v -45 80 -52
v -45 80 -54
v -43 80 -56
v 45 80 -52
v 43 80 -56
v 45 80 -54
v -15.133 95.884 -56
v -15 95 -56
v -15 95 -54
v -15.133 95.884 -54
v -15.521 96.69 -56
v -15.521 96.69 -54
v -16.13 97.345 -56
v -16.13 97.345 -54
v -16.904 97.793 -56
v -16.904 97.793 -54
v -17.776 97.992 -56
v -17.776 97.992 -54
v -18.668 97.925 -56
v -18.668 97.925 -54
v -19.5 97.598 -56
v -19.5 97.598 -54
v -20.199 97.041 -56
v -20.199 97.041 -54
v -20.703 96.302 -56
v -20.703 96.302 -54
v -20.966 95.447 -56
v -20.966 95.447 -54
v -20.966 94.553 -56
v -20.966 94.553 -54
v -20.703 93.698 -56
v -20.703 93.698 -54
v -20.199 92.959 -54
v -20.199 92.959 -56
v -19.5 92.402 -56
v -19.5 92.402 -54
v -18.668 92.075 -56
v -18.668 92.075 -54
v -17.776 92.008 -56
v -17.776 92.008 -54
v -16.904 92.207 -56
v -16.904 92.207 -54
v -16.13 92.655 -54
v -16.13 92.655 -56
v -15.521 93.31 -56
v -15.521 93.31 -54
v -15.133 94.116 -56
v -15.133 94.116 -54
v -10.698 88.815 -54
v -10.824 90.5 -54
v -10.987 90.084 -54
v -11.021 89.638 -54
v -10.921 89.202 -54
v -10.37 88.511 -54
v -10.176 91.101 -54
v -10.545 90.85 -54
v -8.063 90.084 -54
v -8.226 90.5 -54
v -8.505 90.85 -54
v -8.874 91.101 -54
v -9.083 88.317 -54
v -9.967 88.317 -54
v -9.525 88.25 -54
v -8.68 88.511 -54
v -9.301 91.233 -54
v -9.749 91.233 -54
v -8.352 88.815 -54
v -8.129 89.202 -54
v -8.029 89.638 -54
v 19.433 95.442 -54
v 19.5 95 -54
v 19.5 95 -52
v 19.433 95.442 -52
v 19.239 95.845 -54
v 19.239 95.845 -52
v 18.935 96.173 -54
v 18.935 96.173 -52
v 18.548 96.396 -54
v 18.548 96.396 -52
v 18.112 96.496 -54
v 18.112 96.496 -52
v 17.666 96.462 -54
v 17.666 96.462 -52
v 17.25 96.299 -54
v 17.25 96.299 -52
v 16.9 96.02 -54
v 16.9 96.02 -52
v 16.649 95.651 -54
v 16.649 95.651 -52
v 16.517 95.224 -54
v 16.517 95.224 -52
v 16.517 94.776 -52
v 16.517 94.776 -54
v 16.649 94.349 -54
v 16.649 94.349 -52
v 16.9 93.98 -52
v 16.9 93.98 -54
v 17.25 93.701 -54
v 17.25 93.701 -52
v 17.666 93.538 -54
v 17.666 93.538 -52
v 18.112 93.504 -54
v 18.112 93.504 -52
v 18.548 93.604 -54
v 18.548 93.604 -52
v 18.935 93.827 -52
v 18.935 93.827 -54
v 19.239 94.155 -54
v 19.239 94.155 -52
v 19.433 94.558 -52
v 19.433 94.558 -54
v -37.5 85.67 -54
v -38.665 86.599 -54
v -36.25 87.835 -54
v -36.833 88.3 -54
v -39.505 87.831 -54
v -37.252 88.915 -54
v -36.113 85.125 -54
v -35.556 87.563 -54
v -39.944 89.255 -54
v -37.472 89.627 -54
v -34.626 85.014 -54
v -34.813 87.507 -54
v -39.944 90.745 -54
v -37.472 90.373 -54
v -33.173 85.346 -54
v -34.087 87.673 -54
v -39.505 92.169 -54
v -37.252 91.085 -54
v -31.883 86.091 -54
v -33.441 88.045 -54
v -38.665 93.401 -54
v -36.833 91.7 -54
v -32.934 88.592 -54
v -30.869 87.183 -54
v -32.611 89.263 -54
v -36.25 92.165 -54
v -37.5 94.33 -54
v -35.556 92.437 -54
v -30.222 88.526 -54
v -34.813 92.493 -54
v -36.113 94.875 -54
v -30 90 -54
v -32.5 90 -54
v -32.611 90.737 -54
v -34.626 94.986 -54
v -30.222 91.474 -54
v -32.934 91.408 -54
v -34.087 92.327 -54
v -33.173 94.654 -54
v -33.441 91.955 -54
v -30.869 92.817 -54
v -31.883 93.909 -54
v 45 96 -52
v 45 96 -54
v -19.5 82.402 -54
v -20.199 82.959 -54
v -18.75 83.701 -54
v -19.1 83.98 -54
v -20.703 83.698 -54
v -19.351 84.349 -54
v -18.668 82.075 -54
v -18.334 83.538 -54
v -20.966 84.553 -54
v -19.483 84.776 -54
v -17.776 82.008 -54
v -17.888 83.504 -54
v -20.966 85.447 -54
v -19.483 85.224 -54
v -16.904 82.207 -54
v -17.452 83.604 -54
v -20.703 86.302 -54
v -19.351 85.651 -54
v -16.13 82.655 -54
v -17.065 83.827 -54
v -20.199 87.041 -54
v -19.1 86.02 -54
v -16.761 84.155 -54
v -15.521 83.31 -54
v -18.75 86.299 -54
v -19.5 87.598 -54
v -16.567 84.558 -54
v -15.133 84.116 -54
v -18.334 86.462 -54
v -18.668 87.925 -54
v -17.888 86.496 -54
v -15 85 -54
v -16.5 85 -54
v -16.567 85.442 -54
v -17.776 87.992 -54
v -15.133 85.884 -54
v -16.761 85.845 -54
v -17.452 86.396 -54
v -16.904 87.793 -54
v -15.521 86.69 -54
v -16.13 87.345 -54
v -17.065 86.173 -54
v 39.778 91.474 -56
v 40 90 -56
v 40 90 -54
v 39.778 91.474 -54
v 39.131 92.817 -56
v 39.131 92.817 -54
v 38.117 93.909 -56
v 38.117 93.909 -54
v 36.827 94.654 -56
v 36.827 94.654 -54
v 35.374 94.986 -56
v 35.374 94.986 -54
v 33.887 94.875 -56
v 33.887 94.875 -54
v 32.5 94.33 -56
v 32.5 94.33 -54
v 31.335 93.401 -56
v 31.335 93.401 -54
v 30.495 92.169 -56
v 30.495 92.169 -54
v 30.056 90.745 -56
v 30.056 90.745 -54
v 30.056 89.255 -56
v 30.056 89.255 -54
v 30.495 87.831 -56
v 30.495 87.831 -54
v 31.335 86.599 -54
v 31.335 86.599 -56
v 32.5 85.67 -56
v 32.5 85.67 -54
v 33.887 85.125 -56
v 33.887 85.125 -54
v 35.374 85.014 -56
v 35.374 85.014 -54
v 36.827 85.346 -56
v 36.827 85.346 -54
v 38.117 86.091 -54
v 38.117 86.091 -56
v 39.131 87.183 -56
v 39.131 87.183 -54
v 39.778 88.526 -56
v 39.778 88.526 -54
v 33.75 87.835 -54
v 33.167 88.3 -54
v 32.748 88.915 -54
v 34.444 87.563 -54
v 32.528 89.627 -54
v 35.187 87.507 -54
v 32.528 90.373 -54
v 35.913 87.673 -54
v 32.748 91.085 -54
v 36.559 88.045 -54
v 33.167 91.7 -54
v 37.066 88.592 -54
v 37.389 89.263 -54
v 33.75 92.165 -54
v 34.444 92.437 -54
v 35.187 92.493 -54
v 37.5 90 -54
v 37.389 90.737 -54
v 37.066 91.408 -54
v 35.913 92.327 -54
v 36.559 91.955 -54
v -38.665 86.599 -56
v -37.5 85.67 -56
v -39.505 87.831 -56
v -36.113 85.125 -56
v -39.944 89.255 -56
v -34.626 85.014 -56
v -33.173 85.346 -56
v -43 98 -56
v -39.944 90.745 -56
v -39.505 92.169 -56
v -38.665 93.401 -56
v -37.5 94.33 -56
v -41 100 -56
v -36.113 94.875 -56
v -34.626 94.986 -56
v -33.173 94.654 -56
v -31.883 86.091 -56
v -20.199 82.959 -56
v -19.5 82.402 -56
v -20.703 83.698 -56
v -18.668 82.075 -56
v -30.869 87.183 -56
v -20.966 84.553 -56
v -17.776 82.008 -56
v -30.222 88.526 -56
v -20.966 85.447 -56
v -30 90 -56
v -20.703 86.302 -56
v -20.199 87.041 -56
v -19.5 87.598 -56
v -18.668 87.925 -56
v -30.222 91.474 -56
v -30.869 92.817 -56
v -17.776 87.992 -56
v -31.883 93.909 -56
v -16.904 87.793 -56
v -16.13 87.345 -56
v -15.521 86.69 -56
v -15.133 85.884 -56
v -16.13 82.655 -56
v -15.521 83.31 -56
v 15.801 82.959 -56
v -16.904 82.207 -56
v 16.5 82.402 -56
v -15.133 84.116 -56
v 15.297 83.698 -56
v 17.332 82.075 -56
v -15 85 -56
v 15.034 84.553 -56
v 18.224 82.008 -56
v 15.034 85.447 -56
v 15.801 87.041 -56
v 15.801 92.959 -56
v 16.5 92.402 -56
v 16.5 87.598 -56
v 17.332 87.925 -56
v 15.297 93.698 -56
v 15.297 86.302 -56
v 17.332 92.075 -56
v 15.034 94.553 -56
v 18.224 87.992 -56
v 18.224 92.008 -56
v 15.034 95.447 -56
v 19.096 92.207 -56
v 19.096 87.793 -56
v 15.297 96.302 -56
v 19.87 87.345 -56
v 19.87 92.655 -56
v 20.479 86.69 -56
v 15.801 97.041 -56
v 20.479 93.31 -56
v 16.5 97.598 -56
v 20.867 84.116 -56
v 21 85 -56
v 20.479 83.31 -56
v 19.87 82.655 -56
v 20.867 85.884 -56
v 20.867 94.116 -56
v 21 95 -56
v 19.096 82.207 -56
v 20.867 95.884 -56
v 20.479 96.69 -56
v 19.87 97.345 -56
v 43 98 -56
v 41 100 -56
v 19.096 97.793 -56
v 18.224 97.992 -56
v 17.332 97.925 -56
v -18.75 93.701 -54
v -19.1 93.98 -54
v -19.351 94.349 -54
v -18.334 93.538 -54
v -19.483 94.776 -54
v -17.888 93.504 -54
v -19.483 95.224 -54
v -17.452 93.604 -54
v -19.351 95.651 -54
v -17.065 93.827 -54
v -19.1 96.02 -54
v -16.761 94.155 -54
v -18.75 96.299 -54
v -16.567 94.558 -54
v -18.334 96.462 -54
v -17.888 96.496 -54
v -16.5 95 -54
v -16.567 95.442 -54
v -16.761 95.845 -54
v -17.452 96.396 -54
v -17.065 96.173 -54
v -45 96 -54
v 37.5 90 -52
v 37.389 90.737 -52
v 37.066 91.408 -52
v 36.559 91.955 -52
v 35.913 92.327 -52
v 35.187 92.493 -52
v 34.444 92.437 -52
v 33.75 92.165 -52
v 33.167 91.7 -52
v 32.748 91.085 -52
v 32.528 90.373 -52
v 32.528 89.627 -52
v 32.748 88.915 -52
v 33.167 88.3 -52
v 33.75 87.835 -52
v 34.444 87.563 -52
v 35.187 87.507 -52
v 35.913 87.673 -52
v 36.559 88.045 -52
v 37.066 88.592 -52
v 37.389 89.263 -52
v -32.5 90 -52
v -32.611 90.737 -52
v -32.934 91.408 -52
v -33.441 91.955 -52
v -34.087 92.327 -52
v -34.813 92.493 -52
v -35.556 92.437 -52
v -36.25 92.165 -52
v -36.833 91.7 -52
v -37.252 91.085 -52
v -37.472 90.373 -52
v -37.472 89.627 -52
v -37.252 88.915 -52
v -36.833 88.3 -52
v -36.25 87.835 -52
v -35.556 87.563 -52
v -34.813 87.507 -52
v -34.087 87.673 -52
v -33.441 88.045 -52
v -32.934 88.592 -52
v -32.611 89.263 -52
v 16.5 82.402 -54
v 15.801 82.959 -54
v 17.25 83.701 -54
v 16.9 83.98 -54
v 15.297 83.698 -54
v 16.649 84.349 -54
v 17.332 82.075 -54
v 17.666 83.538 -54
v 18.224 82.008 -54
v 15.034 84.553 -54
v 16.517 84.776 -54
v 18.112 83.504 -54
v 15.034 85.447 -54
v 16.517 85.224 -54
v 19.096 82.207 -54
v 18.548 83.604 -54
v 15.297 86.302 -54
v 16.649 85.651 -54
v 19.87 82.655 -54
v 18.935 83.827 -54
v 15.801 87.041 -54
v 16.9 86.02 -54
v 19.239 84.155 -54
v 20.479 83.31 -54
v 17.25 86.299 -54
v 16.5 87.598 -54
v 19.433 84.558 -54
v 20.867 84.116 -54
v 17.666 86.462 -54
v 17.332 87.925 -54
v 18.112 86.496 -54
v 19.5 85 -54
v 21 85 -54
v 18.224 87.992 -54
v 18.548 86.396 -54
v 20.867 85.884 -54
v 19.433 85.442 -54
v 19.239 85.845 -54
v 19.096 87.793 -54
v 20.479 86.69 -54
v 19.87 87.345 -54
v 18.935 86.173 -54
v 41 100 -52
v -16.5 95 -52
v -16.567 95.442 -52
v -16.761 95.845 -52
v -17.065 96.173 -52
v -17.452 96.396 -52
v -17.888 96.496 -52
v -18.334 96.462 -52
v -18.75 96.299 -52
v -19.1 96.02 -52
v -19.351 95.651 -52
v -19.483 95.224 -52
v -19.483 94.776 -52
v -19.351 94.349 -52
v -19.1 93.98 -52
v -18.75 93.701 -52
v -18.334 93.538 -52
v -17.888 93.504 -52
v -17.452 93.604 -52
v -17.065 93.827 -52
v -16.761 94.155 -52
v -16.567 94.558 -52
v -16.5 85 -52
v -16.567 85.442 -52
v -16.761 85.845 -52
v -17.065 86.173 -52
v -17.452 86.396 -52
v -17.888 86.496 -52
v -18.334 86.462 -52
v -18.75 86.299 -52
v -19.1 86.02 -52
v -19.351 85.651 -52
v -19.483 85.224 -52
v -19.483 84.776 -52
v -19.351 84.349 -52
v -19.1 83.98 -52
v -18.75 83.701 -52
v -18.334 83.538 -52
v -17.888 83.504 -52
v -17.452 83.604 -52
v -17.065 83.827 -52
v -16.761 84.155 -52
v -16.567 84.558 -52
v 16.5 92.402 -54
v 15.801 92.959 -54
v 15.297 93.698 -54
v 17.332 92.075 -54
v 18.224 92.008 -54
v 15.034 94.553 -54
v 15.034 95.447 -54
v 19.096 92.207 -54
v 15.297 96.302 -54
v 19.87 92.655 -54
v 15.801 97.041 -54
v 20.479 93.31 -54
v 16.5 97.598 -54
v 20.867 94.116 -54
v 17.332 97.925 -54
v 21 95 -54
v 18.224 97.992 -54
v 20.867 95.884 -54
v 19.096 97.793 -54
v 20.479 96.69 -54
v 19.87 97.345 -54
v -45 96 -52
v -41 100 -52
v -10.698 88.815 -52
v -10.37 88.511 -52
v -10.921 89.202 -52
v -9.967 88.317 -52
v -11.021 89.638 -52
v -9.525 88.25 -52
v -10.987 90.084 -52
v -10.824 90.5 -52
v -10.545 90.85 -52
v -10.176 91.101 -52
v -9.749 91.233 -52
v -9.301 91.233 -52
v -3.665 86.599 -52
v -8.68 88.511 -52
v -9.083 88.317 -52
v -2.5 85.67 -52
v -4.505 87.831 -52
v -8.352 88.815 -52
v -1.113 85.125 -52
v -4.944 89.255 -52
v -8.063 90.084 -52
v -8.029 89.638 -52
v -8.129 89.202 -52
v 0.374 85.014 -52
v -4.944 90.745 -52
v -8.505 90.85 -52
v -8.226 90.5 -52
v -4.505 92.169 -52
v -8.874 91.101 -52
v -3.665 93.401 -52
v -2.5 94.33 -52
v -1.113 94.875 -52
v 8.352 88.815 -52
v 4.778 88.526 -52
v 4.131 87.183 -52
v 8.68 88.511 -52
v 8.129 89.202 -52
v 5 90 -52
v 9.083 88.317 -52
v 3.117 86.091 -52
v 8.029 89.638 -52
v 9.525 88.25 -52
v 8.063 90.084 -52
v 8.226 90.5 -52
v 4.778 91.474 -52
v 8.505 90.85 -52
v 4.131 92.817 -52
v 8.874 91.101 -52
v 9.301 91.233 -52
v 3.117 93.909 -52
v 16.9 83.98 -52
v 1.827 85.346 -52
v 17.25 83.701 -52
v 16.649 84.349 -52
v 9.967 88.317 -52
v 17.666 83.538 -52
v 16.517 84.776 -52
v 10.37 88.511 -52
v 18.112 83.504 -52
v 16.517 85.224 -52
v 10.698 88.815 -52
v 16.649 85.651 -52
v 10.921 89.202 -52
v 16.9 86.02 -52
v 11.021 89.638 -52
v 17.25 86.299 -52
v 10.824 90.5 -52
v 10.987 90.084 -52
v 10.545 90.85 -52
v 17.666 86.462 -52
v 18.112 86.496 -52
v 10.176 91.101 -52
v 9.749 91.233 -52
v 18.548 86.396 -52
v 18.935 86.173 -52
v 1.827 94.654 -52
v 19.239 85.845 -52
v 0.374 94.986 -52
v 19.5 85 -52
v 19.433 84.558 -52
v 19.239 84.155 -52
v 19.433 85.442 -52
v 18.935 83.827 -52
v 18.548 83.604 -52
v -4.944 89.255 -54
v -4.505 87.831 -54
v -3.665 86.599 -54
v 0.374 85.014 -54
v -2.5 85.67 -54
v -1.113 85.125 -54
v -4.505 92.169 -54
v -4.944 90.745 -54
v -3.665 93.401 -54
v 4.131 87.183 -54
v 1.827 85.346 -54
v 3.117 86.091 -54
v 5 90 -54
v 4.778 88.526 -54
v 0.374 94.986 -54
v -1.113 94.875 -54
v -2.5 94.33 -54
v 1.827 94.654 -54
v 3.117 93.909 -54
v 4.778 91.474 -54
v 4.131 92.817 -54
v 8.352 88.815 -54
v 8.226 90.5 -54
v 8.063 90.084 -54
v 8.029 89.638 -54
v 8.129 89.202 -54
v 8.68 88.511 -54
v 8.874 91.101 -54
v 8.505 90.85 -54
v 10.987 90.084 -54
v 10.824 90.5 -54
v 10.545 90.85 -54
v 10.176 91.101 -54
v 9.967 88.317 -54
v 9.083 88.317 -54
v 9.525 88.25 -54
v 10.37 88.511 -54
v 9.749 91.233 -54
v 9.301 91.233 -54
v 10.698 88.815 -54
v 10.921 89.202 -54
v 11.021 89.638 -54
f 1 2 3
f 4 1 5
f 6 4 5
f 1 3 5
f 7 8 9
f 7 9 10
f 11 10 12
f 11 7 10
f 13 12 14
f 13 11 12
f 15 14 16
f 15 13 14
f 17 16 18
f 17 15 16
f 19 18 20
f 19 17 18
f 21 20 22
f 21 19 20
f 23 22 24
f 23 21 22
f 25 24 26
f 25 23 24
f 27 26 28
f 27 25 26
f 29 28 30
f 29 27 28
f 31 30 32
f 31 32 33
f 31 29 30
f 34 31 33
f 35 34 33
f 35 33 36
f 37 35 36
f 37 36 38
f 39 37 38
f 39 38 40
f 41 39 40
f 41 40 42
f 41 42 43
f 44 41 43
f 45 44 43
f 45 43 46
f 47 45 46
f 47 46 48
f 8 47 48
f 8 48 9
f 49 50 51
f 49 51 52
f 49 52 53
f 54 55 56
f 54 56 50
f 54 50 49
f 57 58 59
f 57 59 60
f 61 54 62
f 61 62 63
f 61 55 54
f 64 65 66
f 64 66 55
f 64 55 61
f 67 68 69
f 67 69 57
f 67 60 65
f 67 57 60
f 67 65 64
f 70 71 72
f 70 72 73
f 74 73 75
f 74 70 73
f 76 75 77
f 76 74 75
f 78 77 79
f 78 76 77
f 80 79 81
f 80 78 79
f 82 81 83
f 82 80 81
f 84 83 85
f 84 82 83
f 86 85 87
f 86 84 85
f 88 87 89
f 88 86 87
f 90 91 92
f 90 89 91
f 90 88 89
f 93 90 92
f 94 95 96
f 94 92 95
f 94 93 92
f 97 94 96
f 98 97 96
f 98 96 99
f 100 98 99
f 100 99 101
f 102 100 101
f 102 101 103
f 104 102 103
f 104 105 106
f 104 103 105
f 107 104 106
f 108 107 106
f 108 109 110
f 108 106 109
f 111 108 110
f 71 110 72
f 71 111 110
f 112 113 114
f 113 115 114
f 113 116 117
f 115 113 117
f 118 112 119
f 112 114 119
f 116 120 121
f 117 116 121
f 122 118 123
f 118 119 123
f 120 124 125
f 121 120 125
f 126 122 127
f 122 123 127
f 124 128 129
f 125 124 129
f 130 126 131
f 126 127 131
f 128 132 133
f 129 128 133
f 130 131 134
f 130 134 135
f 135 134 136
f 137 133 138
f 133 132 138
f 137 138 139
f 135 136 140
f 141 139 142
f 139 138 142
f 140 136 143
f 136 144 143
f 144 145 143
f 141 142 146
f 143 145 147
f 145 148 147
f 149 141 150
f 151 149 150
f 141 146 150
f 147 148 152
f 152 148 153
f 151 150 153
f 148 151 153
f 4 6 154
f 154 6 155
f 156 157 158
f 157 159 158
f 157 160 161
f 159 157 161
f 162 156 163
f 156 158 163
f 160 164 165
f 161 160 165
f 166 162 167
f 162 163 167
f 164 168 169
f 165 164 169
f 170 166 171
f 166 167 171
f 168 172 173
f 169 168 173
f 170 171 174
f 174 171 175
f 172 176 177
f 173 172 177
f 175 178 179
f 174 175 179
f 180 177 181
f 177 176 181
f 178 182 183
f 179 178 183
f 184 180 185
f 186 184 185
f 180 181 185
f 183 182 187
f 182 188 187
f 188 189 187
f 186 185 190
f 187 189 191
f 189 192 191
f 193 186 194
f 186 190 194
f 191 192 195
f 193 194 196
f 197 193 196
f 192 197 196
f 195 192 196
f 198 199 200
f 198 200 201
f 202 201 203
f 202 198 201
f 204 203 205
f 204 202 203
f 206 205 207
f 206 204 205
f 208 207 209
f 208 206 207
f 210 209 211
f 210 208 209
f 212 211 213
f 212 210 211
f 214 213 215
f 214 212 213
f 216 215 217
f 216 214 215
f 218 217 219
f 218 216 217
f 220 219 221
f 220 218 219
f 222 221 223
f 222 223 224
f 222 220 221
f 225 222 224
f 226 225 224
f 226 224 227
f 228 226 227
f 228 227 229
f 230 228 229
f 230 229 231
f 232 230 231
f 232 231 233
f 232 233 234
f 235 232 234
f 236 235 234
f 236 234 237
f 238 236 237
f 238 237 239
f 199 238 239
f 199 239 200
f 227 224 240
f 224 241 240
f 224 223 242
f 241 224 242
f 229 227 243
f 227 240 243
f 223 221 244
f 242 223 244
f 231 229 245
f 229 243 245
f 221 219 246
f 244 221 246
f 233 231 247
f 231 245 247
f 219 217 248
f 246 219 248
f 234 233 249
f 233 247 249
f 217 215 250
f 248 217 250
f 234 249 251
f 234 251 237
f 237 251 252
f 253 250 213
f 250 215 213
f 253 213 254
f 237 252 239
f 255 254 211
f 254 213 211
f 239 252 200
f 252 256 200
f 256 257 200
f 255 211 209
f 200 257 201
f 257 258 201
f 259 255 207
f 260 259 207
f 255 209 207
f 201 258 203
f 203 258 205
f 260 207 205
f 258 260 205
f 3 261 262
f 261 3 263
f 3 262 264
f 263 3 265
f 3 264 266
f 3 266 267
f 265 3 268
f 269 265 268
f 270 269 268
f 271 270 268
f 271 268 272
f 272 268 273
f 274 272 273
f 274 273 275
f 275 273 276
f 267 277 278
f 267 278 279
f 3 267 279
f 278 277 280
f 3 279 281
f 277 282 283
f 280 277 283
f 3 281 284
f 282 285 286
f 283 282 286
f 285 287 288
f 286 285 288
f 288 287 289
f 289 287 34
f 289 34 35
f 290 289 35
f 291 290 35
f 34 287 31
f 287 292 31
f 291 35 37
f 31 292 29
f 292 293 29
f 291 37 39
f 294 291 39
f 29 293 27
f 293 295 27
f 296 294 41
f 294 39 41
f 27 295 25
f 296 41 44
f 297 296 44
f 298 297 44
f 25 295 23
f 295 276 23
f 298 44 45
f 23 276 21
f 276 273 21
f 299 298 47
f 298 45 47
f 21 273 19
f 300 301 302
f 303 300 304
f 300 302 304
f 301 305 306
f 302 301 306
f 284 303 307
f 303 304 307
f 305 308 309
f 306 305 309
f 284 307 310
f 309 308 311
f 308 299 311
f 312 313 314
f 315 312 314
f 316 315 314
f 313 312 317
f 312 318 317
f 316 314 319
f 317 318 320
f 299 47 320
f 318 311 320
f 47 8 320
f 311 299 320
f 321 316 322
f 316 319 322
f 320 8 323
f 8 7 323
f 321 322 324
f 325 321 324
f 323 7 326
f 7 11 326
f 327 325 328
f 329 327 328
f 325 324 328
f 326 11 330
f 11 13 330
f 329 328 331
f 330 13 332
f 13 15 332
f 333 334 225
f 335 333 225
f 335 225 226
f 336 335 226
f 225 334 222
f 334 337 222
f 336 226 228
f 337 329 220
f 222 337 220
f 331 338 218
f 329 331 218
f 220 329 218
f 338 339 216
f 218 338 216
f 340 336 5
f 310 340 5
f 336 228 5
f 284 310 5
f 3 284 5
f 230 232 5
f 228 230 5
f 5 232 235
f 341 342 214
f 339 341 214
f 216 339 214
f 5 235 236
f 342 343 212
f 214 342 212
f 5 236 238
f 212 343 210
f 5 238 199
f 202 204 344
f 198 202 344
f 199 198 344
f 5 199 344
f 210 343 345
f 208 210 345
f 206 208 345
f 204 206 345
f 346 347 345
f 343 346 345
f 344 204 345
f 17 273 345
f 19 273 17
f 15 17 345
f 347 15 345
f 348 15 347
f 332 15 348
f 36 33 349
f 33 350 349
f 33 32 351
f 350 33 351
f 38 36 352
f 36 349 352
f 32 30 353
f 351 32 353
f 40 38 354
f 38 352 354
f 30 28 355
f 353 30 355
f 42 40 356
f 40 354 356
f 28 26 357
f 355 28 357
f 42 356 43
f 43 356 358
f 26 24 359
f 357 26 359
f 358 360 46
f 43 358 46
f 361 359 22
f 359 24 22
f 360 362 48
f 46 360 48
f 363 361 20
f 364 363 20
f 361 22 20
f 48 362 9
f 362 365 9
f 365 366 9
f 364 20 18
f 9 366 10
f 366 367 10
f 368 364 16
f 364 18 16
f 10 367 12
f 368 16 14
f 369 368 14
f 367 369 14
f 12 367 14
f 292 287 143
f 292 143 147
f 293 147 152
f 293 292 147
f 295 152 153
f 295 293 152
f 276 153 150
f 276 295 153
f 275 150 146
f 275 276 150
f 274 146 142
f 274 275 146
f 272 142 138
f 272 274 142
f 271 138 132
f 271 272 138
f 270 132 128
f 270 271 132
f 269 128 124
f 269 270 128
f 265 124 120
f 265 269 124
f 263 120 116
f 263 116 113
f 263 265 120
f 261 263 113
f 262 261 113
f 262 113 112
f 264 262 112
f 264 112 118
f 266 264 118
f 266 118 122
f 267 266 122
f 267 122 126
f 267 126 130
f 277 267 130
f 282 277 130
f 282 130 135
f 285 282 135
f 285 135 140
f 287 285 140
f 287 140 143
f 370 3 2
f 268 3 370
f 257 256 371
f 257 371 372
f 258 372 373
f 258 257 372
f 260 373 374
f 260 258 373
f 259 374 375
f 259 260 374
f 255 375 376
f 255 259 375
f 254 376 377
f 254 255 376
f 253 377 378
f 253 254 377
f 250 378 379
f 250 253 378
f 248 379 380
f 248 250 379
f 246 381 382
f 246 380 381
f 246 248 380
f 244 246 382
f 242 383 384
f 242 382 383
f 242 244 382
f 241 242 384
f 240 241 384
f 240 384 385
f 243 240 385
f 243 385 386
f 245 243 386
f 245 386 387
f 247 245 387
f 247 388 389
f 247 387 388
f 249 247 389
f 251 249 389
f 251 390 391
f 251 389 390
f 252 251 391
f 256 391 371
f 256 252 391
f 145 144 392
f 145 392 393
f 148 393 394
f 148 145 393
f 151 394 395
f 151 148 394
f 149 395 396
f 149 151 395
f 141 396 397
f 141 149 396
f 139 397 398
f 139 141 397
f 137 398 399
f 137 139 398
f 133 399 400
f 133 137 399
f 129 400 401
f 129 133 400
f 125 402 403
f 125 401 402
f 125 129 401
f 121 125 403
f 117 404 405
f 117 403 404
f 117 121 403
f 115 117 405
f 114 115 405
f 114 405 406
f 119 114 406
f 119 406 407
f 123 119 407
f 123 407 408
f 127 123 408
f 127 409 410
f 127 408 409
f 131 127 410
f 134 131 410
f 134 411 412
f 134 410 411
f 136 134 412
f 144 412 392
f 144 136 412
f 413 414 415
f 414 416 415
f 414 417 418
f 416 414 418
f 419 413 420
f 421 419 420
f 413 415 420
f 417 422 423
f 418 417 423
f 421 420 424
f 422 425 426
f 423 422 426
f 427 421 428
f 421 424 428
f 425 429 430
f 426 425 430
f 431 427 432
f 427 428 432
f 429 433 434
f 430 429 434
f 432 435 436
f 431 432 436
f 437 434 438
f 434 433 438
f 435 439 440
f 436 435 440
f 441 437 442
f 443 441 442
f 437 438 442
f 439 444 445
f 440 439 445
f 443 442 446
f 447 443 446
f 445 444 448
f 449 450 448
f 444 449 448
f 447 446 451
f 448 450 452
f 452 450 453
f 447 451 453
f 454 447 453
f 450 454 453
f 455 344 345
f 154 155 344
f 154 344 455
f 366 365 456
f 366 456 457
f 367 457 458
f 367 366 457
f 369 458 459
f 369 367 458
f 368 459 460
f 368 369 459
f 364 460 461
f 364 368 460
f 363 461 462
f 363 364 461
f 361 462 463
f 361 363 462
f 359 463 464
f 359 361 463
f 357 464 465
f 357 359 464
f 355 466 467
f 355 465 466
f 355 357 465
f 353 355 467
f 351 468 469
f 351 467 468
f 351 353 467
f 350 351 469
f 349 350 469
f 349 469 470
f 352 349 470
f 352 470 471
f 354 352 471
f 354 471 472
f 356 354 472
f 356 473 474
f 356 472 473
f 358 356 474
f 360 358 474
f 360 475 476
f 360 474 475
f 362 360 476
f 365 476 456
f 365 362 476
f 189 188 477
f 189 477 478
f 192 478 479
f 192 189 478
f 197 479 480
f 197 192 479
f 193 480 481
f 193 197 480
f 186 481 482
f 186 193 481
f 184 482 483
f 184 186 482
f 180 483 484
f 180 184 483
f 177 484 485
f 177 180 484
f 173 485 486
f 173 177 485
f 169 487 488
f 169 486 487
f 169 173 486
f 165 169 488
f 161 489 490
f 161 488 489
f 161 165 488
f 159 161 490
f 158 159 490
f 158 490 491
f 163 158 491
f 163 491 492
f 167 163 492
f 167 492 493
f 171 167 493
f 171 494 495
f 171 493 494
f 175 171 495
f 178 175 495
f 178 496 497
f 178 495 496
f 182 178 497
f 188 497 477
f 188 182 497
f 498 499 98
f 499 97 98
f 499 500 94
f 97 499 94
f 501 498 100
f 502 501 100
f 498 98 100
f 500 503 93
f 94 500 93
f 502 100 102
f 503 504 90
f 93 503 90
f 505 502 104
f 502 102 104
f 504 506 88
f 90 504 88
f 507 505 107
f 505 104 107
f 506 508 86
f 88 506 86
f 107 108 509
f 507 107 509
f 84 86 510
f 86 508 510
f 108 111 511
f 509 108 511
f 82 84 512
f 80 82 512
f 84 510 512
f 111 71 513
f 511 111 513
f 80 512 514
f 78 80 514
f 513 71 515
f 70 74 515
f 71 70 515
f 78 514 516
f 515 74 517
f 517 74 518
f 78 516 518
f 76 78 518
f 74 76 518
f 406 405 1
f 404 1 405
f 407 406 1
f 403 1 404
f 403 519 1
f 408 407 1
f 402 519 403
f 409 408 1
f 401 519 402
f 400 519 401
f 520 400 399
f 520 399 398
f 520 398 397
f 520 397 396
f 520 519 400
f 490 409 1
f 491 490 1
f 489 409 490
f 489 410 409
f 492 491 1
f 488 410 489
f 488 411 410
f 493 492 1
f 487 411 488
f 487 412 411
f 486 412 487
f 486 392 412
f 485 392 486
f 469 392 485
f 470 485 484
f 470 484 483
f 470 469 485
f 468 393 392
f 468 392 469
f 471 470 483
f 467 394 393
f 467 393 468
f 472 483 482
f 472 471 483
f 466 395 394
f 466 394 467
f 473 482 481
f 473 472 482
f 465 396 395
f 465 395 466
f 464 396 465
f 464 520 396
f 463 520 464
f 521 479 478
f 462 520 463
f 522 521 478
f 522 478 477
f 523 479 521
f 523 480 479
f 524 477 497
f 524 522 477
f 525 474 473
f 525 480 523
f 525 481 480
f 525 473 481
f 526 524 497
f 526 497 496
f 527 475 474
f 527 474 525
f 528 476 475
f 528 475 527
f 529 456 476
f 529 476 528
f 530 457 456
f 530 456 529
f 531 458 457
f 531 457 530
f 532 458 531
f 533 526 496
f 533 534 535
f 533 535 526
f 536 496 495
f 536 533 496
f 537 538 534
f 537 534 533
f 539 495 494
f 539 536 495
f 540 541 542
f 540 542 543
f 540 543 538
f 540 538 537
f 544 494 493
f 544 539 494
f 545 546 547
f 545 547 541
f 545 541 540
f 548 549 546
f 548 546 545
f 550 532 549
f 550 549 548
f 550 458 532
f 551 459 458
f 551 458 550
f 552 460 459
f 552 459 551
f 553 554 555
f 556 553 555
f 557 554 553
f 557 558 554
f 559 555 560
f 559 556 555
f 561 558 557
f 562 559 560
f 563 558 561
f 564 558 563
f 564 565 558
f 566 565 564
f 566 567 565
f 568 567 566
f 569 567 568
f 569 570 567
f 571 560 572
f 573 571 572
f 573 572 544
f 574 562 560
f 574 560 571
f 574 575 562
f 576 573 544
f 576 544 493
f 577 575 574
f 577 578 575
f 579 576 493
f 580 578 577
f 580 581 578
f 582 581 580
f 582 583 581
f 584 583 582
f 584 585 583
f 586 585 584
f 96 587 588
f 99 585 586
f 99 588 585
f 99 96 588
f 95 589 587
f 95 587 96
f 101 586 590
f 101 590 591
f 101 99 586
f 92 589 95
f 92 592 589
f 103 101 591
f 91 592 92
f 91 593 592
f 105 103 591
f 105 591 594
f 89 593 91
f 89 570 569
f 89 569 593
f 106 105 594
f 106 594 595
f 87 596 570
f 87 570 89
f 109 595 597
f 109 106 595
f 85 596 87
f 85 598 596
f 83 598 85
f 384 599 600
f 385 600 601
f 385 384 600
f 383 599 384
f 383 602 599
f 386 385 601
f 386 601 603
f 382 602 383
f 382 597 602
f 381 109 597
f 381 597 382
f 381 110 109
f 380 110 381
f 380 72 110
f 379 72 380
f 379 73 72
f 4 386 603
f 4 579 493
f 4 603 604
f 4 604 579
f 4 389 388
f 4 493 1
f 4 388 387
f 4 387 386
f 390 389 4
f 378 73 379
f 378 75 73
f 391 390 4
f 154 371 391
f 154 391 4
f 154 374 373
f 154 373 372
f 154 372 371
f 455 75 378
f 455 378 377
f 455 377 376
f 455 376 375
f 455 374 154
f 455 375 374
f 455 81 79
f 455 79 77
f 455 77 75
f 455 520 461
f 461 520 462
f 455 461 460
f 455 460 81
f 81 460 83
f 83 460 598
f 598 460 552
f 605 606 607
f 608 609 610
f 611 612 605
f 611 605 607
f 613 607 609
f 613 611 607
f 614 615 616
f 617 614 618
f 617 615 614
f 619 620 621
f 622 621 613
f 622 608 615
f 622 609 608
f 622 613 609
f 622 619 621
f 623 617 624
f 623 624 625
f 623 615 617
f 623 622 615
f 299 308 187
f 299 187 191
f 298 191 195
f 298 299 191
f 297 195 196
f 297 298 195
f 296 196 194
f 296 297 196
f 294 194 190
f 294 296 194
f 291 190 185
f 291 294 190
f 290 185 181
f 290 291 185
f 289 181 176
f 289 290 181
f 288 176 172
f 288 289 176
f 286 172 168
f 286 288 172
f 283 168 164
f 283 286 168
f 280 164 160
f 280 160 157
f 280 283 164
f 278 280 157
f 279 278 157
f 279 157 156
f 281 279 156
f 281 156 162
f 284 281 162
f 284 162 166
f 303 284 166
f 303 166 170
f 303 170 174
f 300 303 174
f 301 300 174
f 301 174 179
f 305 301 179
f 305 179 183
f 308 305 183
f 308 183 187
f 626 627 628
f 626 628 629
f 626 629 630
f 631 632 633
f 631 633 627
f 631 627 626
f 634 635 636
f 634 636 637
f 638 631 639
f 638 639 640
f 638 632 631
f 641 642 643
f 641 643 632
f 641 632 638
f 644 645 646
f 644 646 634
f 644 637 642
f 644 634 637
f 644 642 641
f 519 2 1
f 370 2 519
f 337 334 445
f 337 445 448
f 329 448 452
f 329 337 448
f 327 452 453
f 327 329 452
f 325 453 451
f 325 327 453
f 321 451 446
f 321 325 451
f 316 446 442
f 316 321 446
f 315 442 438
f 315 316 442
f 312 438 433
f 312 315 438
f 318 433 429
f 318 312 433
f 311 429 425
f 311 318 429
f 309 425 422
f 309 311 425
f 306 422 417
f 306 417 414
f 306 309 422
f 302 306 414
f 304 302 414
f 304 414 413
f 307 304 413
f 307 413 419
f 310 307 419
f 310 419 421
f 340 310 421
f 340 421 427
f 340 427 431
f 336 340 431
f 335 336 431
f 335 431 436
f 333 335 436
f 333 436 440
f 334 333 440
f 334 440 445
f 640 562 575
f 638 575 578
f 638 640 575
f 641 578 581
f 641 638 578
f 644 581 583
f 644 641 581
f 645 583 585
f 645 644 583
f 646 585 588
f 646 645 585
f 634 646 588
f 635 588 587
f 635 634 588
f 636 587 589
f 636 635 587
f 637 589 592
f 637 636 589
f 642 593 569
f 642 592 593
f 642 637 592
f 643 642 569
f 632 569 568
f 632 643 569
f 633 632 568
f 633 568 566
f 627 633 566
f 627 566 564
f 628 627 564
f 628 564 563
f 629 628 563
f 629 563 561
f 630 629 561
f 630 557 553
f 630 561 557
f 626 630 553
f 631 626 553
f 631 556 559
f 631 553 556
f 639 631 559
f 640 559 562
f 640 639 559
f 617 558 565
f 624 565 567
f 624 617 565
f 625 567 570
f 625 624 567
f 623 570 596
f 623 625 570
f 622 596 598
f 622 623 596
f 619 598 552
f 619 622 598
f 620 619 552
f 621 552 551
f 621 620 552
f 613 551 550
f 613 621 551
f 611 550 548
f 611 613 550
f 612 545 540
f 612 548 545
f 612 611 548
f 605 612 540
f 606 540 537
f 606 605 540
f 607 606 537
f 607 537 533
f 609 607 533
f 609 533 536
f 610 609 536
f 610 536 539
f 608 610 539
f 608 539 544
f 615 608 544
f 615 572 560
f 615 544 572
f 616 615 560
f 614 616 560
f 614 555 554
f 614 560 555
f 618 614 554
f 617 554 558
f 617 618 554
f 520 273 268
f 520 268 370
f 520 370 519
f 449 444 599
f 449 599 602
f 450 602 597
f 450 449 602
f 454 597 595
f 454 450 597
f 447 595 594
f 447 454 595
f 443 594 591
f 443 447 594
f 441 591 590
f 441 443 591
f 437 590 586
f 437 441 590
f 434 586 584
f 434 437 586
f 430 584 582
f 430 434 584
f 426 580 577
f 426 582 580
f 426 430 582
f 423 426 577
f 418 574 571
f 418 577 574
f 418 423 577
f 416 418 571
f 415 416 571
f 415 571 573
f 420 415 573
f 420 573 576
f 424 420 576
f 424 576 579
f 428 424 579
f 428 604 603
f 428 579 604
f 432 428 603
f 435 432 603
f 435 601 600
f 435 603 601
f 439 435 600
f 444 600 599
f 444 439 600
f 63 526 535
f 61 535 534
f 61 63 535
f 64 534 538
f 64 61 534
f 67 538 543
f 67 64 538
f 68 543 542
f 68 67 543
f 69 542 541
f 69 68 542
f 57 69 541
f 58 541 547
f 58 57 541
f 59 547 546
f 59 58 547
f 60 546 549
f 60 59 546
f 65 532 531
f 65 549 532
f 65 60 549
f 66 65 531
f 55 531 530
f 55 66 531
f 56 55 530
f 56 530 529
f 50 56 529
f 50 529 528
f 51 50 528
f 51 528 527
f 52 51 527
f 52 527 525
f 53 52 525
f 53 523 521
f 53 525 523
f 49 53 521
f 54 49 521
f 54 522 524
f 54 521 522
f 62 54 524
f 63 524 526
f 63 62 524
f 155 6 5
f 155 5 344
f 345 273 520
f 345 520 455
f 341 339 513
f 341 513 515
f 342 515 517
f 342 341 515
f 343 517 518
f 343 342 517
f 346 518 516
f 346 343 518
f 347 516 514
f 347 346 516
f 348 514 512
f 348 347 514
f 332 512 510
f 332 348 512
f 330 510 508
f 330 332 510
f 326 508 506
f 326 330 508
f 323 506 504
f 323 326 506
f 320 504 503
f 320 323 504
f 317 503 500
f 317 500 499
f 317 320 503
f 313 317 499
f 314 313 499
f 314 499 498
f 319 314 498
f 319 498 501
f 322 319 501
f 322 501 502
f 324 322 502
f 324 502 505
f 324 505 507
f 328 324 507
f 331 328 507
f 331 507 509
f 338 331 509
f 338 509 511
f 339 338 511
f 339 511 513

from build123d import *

# Parameters (mm, degrees)
CYLINDER1675_R              = 1.5
CYLINDER1675_DEPTH          = 20
CYLINDER1676_R              = 1.5
CYLINDER1676_DEPTH          = 20
COMPOUND830_ROLL_ANGLE      = 90
COMPOUND830_PLACEMENT_ANGLE = 90
CYLINDER1665_R              = 2.5
CYLINDER1665_DEPTH          = 20
CYLINDER1664_R              = 2.5
CYLINDER1664_DEPTH          = 20
CYLINDER1663_R              = 5
CYLINDER1663_DEPTH          = 5
CYLINDER1662_R              = 5
CYLINDER1662_DEPTH          = 5
CYLINDER1659_R              = 3
CYLINDER1659_DEPTH          = 3
CYLINDER1660_R              = 3
CYLINDER1660_DEPTH          = 3
CYLINDER1661_R              = 3
CYLINDER1661_DEPTH          = 3
CYLINDER1658_R              = 3
CYLINDER1658_DEPTH          = 3
CYLINDER1651_R              = 1.5
CYLINDER1651_DEPTH          = 60
CYLINDER1652_R              = 1.5
CYLINDER1652_DEPTH          = 60
CYLINDER1653_R              = 1.5
CYLINDER1653_DEPTH          = 60
CYLINDER1650_R              = 1.5
CYLINDER1650_DEPTH          = 60
CYLINDER1617_R              = 5
CYLINDER1617_DEPTH          = 5
BOX643_W                    = 90
BOX643_H                    = 20
BOX643_DEPTH                = 4
CHAMFER040_SIZE             = 4
CHAMFER041_SIZE             = 2


with BuildPart() as v_lec1675:
    # Cylinder1675 → Cylinder1675 (new body)
    with BuildSketch(Plane(origin=(15.75, 114, 58.525), x_dir=(-1, 0, 0), z_dir=(0, 1, 0))):
        Circle(CYLINDER1675_R)
    extrude(amount=CYLINDER1675_DEPTH)


with BuildPart() as compound831:
    # Cylinder1676 → Cylinder1676 (new body)
    with BuildSketch(Plane(origin=(15.75, 114, 39.475), x_dir=(-1, 0, 0), z_dir=(0, 1, 0))):
        Circle(CYLINDER1676_R)
    extrude(amount=CYLINDER1676_DEPTH)

    # Compound830: union Válec1675
    add(v_lec1675.part)


with BuildPart() as compound831_1:
    # Compound830 roll: moved
    add(compound831.part.rotate(Axis((0, 0, 0), (1, 0, 0)), COMPOUND830_ROLL_ANGLE))


with BuildPart() as compound831_2:
    # Compound830 placement: moved
    add(compound831_1.part.moved(Location((-49, 0, -96))).rotate(Axis((-49, 0, -96), (0, 0, 1)), COMPOUND830_PLACEMENT_ANGLE))


with BuildPart() as compound831_3:
    # Compound831 placement: moved
    add(compound831_2.part.moved(Location((0, 74, -72))))


with BuildPart() as v_lec1665:
    # Cylinder1665 → Cylinder1665 (new body)
    with BuildSketch(Plane(origin=(-35, 90, -59), x_dir=(1, 0, 0), z_dir=(0, 0, 1))):
        Circle(CYLINDER1665_R)
    extrude(amount=CYLINDER1665_DEPTH)


with BuildPart() as compound817:
    # Cylinder1664 → Cylinder1664 (new body)
    with BuildSketch(Plane(origin=(35, 90, -59), x_dir=(1, 0, 0), z_dir=(0, 0, 1))):
        Circle(CYLINDER1664_R)
    extrude(amount=CYLINDER1664_DEPTH)

    # Compound817: union Válec1665
    add(v_lec1665.part)


with BuildPart() as v_lec1663:
    # Cylinder1663 → Cylinder1663 (new body)
    with BuildSketch(Plane(origin=(-35, 90, -59), x_dir=(1, 0, 0), z_dir=(0, 0, 1))):
        Circle(CYLINDER1663_R)
    extrude(amount=CYLINDER1663_DEPTH)


with BuildPart() as compound816:
    # Cylinder1662 → Cylinder1662 (new body)
    with BuildSketch(Plane(origin=(35, 90, -59), x_dir=(1, 0, 0), z_dir=(0, 0, 1))):
        Circle(CYLINDER1662_R)
    extrude(amount=CYLINDER1662_DEPTH)

    # Compound816: union Válec1663
    add(v_lec1663.part)


with BuildPart() as v_lec1659:
    # Cylinder1659 → Cylinder1659 (new body)
    with BuildSketch(Plane(origin=(18, 85, -57), x_dir=(1, 0, 0), z_dir=(0, 0, 1))):
        Circle(CYLINDER1659_R)
    extrude(amount=CYLINDER1659_DEPTH)


with BuildPart() as v_lec1660:
    # Cylinder1660 → Cylinder1660 (new body)
    with BuildSketch(Plane(origin=(-18, 85, -57), x_dir=(1, 0, 0), z_dir=(0, 0, 1))):
        Circle(CYLINDER1660_R)
    extrude(amount=CYLINDER1660_DEPTH)


with BuildPart() as v_lec1661:
    # Cylinder1661 → Cylinder1661 (new body)
    with BuildSketch(Plane(origin=(-18, 95, -57), x_dir=(1, 0, 0), z_dir=(0, 0, 1))):
        Circle(CYLINDER1661_R)
    extrude(amount=CYLINDER1661_DEPTH)


with BuildPart() as compound815:
    # Cylinder1658 → Cylinder1658 (new body)
    with BuildSketch(Plane(origin=(18, 95, -57), x_dir=(1, 0, 0), z_dir=(0, 0, 1))):
        Circle(CYLINDER1658_R)
    extrude(amount=CYLINDER1658_DEPTH)

    # Compound815: union Válec1659, Válec1660, Válec1661
    add(v_lec1659.part)
    add(v_lec1660.part)
    add(v_lec1661.part)


with BuildPart() as v_lec1651:
    # Cylinder1651 → Cylinder1651 (new body)
    with BuildSketch(Plane(origin=(18, 85, -57), x_dir=(1, 0, 0), z_dir=(0, 0, 1))):
        Circle(CYLINDER1651_R)
    extrude(amount=CYLINDER1651_DEPTH)


with BuildPart() as v_lec1652:
    # Cylinder1652 → Cylinder1652 (new body)
    with BuildSketch(Plane(origin=(-18, 85, -57), x_dir=(1, 0, 0), z_dir=(0, 0, 1))):
        Circle(CYLINDER1652_R)
    extrude(amount=CYLINDER1652_DEPTH)


with BuildPart() as v_lec1653:
    # Cylinder1653 → Cylinder1653 (new body)
    with BuildSketch(Plane(origin=(-18, 95, -57), x_dir=(1, 0, 0), z_dir=(0, 0, 1))):
        Circle(CYLINDER1653_R)
    extrude(amount=CYLINDER1653_DEPTH)


with BuildPart() as compound813:
    # Cylinder1650 → Cylinder1650 (new body)
    with BuildSketch(Plane(origin=(18, 95, -57), x_dir=(1, 0, 0), z_dir=(0, 0, 1))):
        Circle(CYLINDER1650_R)
    extrude(amount=CYLINDER1650_DEPTH)

    # Compound813: union Válec1651, Válec1652, Válec1653
    add(v_lec1651.part)
    add(v_lec1652.part)
    add(v_lec1653.part)


with BuildPart() as v_lec1617:
    # Cylinder1617 → Cylinder1617 (new body)
    with BuildSketch(Plane(origin=(0, 90, -54), x_dir=(1, 0, 0), z_dir=(0, 0, 1))):
        Circle(CYLINDER1617_R)
    extrude(amount=CYLINDER1617_DEPTH)


with BuildPart() as cut335:
    # Box643 → Box643 (new body)
    with BuildSketch(Plane(origin=(-45, 80, -56), x_dir=(1, 0, 0), z_dir=(0, 0, 1))):
        with Locations((45, 10)):
            Rectangle(BOX643_W, BOX643_H)
    extrude(amount=BOX643_DEPTH)

    # Cut310: cut Válec1617
    add(v_lec1617.part, mode=Mode.SUBTRACT)

    # Cut326: cut Compound813
    add(compound813.part, mode=Mode.SUBTRACT)

    # Cut328: cut Compound815
    add(compound815.part, mode=Mode.SUBTRACT)

    # Cut329: cut Compound816
    add(compound816.part, mode=Mode.SUBTRACT)

    # Cut330: cut Compound817
    add(compound817.part, mode=Mode.SUBTRACT)

    # Chamfer040
    chamfer040_edges = [cut335.edges().sort_by_distance(p)[0] for p in [
        (-45, 100, -54),
        (45, 100, -54),
    ]]
    chamfer(chamfer040_edges, length=CHAMFER040_SIZE)

    # Chamfer041
    chamfer041_edges = [cut335.edges().sort_by_distance(p)[0] for p in [
        (-45, 88, -56),
        (45, 88, -56),
    ]]
    chamfer(chamfer041_edges, length=CHAMFER041_SIZE)

    # Cut335: cut Compound831
    add(compound831_3.part, mode=Mode.SUBTRACT)


solid = cut335.part
